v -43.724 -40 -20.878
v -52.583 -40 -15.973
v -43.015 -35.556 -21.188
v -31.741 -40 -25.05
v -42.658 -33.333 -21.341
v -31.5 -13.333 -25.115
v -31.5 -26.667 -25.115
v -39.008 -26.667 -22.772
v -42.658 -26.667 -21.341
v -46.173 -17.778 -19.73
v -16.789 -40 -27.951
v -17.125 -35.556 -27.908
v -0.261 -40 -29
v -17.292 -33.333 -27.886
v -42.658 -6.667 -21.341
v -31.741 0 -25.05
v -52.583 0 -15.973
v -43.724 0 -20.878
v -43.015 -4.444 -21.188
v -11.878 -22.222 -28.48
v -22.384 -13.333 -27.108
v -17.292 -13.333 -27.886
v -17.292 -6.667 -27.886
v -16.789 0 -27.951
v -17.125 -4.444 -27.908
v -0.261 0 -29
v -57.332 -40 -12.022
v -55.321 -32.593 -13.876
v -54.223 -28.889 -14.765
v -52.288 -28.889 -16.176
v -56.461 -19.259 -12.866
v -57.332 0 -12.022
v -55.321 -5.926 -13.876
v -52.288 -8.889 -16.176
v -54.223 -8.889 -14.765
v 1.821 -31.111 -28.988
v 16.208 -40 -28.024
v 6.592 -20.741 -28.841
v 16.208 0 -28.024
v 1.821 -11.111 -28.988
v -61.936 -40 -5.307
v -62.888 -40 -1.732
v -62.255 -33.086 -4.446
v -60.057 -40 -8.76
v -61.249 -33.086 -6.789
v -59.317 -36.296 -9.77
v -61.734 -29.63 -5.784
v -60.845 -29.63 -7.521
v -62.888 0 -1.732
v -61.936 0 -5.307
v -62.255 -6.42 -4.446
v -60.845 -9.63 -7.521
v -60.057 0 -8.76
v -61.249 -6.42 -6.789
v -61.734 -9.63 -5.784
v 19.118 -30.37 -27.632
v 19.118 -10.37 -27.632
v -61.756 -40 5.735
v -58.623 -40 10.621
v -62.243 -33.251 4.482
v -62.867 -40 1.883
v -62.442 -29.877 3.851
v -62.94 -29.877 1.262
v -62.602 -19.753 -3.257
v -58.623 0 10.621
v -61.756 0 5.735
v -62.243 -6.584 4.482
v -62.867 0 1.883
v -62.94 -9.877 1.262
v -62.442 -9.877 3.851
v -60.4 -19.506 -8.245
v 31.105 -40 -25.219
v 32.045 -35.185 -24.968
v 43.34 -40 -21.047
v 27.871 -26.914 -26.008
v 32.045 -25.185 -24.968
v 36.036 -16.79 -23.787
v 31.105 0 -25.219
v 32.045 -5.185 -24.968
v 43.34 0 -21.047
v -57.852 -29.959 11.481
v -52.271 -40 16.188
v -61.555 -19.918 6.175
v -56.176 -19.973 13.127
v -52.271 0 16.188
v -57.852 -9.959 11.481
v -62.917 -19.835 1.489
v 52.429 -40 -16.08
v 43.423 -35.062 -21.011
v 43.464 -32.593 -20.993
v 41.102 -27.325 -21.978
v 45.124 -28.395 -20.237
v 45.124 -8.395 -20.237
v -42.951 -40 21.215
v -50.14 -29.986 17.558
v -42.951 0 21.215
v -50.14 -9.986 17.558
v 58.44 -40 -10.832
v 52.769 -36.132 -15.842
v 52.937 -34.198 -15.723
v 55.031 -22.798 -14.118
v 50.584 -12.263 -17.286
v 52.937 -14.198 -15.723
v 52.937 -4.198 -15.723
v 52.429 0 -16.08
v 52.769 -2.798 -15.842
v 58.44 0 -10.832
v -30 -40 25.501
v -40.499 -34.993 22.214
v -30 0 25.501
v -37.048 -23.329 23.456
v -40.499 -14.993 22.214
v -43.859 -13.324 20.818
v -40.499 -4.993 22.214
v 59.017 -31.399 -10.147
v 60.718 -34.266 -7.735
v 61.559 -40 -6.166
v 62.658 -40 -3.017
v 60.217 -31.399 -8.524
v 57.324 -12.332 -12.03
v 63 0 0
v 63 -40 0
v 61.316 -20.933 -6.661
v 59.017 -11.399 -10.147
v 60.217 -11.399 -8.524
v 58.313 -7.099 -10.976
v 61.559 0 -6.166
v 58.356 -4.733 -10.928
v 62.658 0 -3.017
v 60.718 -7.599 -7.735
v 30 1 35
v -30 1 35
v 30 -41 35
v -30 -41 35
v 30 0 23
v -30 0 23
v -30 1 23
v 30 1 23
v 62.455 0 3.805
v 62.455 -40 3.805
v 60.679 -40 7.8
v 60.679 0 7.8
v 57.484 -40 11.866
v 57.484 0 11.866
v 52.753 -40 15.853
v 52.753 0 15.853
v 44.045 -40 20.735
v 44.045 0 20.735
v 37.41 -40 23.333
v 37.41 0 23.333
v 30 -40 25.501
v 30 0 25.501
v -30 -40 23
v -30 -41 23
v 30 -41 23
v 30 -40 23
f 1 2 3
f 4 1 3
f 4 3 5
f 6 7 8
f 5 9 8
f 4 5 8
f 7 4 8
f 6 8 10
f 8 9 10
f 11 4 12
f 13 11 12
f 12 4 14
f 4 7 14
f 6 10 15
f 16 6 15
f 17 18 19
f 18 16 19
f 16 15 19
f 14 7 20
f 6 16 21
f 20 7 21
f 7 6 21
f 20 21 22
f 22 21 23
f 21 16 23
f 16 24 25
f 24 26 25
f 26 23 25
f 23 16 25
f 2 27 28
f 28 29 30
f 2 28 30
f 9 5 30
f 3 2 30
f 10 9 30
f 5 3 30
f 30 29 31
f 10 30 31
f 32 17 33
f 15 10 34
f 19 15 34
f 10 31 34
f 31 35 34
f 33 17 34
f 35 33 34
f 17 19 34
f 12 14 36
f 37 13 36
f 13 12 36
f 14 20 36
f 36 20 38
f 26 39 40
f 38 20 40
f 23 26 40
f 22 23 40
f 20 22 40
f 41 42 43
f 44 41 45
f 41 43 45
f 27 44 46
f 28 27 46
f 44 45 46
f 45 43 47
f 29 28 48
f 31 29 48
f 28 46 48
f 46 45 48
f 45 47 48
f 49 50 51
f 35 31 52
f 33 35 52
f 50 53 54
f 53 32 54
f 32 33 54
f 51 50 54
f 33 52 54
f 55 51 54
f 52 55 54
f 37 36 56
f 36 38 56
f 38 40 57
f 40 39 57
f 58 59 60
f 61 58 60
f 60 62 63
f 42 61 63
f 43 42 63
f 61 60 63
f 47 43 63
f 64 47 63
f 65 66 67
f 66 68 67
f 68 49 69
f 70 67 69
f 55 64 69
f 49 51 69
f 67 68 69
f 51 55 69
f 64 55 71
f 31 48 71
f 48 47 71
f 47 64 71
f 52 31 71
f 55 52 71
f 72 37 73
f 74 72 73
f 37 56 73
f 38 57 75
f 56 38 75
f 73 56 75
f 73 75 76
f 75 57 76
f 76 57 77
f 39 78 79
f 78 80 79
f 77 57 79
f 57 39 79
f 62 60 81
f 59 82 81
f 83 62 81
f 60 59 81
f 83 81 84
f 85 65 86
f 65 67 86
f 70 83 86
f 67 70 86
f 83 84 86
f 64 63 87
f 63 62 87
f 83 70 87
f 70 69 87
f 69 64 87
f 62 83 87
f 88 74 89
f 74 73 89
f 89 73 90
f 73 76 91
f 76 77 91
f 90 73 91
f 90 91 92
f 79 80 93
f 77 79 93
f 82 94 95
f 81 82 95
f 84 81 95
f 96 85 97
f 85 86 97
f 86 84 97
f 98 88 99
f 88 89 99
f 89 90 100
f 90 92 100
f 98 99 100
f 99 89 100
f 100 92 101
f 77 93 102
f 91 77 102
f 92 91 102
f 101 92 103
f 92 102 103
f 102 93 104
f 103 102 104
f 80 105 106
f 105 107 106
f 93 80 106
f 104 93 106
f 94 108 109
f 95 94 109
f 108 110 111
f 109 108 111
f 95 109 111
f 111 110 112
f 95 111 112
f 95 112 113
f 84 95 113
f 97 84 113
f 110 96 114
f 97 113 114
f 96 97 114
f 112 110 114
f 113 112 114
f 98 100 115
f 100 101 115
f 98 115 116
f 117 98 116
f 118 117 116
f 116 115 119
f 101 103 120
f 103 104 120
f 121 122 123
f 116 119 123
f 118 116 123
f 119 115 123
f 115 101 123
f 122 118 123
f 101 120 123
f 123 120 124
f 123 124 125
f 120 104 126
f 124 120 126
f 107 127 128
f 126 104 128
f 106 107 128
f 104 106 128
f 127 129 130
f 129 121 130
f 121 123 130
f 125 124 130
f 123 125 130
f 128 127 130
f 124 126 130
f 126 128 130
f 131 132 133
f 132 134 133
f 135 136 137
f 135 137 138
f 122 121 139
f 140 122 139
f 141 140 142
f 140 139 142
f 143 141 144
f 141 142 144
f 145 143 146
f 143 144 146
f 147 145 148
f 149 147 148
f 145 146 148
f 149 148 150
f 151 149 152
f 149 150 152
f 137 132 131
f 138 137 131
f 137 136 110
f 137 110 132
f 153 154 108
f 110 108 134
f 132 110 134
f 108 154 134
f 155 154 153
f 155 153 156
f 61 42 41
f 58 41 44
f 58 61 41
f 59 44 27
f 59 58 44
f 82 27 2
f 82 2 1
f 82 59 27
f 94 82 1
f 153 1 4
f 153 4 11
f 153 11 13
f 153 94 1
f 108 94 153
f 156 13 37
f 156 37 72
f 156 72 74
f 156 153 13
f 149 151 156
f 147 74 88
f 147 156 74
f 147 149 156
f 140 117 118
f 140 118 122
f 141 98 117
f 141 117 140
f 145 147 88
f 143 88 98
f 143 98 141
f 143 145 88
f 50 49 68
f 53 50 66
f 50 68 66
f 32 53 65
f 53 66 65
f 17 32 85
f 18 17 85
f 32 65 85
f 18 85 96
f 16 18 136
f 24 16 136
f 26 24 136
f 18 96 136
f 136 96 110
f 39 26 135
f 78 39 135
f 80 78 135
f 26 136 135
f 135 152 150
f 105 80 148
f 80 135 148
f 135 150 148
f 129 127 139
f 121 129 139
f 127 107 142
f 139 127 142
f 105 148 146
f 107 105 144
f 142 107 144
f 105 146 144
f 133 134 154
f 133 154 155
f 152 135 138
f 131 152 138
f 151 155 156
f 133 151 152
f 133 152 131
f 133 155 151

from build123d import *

# Parameters (mm, degrees)
F1_DEPTH = 40
F3_W     = 60
F3_H     = 12
F4_DEPTH = 21


with BuildPart() as f1:
    # F0 (on Front) → F1 (new body)
    with BuildSketch(Plane.XZ):
        with BuildLine():
            add(Edge.make_bspline(
                [(63, 0), (63, 50.2294734195), (-31.5, 25.1147367097), (-126, 0), (-31.5, -25.1147367097), (63, -50.2294734195), (63, 0)],
                knots=[0, 0, 0, 2.0943951024, 2.0943951024, 4.1887902048, 4.1887902048, 6.2831853072, 6.2831853072, 6.2831853072], degree=2, weights=[1, 0.5, 1, 0.5, 1, 0.5, 1]))
        make_face()
    extrude(amount=F1_DEPTH)

    # F3 (on offset) → F4 (join, symmetric)
    with BuildSketch(Plane.XZ.offset(20)):
        with Locations((0, 29)):
            Rectangle(F3_W, F3_H)
    extrude(amount=F4_DEPTH, both=True)


solid = f1.part
